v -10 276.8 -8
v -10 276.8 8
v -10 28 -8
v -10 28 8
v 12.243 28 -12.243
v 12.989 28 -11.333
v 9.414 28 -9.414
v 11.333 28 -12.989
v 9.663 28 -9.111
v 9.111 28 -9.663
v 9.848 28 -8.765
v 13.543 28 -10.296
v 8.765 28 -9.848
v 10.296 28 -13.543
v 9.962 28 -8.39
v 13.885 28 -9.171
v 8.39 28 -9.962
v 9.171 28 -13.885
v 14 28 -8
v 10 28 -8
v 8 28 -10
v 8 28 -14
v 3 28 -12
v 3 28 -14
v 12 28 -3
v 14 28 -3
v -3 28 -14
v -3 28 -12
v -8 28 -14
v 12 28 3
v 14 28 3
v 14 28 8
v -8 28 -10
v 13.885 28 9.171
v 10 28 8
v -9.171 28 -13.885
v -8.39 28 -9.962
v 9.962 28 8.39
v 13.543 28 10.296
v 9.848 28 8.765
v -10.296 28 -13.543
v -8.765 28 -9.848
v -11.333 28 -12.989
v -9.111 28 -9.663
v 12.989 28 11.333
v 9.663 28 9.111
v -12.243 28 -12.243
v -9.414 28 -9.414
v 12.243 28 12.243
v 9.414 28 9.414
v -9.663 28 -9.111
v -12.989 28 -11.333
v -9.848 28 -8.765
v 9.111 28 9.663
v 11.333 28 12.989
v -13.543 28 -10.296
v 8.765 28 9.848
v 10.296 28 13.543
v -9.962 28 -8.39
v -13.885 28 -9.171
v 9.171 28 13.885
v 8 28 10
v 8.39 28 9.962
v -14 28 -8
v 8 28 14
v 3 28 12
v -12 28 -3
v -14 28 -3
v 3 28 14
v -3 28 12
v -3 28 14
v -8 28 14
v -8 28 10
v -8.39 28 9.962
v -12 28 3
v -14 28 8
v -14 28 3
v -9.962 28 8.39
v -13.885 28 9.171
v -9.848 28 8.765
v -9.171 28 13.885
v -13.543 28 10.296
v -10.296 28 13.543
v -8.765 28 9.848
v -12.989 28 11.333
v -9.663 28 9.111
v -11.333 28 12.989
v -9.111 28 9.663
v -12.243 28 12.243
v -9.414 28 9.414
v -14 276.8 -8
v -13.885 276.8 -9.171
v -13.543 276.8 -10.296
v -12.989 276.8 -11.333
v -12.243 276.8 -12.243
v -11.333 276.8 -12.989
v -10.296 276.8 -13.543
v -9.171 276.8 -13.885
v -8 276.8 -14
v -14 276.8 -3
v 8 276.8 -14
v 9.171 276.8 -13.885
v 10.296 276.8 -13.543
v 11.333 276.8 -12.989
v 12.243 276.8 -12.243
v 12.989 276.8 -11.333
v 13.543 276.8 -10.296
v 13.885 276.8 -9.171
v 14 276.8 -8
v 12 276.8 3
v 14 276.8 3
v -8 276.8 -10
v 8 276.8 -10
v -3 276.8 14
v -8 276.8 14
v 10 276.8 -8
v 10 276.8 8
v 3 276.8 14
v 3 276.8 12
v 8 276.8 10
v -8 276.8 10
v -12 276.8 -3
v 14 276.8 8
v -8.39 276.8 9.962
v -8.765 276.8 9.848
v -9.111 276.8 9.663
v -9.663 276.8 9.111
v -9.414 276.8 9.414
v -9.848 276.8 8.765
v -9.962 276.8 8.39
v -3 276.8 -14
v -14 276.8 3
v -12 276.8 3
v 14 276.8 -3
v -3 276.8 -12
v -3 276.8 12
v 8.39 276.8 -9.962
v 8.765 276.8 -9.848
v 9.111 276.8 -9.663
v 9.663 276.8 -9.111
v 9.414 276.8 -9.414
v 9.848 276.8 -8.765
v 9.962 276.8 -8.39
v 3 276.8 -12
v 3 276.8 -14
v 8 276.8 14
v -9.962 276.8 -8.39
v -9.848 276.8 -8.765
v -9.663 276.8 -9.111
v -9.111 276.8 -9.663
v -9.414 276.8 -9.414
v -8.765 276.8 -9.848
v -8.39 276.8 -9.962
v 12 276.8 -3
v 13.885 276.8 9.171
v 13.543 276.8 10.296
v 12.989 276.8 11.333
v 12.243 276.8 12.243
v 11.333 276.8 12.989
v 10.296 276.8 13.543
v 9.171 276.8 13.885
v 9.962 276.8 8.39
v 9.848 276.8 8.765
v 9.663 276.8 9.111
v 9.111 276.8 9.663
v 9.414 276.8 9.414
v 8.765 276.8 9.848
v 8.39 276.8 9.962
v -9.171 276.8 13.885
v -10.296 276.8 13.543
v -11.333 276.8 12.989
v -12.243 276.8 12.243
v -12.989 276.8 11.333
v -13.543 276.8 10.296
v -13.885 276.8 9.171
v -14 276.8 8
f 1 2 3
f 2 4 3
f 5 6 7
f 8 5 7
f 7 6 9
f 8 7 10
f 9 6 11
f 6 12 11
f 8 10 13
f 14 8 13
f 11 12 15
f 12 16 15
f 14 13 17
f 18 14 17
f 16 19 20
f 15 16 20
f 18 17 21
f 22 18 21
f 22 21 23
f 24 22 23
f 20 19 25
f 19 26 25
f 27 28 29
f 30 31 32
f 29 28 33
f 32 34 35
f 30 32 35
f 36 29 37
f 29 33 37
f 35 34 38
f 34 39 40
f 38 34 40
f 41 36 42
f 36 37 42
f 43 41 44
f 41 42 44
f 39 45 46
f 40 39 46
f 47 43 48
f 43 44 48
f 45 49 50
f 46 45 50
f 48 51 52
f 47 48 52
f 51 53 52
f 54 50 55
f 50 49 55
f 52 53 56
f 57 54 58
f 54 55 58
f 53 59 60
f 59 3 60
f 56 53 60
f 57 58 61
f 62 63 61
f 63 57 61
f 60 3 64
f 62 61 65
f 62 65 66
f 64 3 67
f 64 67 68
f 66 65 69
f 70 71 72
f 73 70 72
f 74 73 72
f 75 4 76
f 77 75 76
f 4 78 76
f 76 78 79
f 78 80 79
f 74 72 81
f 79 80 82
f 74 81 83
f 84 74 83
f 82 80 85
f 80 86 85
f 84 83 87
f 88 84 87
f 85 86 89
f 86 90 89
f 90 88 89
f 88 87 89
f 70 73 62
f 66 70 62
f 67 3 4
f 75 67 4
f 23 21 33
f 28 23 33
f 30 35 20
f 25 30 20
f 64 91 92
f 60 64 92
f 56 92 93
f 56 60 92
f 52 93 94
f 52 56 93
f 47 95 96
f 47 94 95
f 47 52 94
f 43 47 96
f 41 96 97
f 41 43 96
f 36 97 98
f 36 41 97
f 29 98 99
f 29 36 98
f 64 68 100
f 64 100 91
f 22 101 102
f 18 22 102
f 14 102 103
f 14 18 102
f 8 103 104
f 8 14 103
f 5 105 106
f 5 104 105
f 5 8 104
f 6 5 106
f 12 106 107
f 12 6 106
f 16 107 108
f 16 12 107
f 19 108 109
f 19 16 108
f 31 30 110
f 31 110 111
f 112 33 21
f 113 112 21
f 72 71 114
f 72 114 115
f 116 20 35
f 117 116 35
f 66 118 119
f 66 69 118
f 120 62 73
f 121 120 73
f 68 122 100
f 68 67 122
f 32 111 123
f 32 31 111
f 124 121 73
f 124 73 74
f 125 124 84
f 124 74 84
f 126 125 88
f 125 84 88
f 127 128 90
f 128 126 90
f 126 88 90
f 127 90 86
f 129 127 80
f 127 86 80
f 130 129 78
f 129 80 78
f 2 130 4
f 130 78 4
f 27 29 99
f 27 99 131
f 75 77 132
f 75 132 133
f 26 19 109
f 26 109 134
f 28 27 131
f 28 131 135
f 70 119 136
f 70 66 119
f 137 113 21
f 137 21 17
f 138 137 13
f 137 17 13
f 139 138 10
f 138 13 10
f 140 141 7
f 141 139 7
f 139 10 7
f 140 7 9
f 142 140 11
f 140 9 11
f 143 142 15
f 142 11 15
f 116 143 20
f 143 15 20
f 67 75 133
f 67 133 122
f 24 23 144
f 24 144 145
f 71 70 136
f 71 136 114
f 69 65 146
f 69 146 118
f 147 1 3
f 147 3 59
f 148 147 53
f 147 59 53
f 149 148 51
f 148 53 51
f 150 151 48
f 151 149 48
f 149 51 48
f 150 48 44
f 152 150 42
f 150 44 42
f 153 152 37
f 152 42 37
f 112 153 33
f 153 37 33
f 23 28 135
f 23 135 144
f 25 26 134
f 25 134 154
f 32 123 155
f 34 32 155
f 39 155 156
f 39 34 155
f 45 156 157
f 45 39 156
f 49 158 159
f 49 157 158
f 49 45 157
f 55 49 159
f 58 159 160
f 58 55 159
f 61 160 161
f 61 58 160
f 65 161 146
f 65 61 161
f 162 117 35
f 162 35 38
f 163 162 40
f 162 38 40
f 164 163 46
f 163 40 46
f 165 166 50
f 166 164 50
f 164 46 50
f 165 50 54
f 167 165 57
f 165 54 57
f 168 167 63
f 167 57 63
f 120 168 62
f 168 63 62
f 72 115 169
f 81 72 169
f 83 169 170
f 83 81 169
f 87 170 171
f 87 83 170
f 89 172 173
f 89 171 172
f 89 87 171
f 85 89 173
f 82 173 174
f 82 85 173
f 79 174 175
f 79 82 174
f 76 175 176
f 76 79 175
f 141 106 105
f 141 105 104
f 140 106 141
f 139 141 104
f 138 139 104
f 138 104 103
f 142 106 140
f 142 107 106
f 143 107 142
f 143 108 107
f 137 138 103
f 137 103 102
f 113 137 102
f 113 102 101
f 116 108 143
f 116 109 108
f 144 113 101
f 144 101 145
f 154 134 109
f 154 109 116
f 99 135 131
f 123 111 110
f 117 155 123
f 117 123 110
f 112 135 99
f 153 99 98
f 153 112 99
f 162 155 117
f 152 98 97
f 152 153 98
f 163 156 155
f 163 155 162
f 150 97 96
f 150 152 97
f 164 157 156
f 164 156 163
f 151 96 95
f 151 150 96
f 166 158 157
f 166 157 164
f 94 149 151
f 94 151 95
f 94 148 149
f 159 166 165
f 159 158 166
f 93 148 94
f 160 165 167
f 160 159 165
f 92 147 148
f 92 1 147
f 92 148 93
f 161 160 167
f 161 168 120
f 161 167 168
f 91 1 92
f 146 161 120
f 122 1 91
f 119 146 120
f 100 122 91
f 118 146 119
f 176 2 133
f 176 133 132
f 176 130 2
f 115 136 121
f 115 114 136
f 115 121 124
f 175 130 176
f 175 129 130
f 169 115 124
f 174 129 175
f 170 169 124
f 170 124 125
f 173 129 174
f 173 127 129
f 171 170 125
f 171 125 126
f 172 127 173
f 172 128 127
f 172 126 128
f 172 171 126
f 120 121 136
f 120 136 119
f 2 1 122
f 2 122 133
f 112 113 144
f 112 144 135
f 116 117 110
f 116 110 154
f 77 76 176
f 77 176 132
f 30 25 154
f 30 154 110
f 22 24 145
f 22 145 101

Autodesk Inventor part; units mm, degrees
ref_plane "Start Plane" through (0, 28, 0) normal (0, 1, 0) x (-1, 0, 0)
ref_plane "End Plane" through (0, 276.8, 0) normal (0, 1, 0) x (-1, 0, 0)
sketch "Sketch" plane through (0, 0, 0) normal (0, 1, 0) x (-1, 0, 0)
  line L0 (8, -10) -> (-8, -10)
  line L1 (-10, -8) -> (-10, 8)
  line L2 (-8, 10) -> (8, 10)
  line L3 (10, 8) -> (10, -8)
  line L4 (10, -10) -> (-10, 10) construction
  line L5 (-10, -10) -> (10, 10) construction
  line L6 (14, -14) -> (-14, 14) construction
  line L7 (-14, -14) -> (14, 14) construction
  arc A0 (8, -10) -> (10, -8) centre (8, -8) ccw
  arc A1 (-10, -8) -> (-8, -10) centre (-8, -8) ccw
  arc A2 (-8, 10) -> (-10, 8) centre (-8, 8) ccw
  arc A3 (10, 8) -> (8, 10) centre (8, 8) ccw
  arc A4 (8, -14) -> (14, -8) centre (8, -8) ccw
  arc A5 (-14, -8) -> (-8, -14) centre (-8, -8) ccw
  arc A6 (-8, 14) -> (-14, 8) centre (-8, 8) ccw
  arc A7 (14, 8) -> (8, 14) centre (8, 8) ccw
  line L8 (3, -14) -> (3, -12)
  line L9 (3, -12) -> (-3, -12)
  line L10 (-3, -12) -> (-3, -14)
  line L11 (-14, -3) -> (-12, -3)
  line L12 (-12, -3) -> (-12, 3)
  line L13 (-12, 3) -> (-14, 3)
  line L14 (-3, 14) -> (-3, 12)
  line L15 (-3, 12) -> (3, 12)
  line L16 (3, 12) -> (3, 14)
  line L17 (14, 3) -> (12, 3)
  line L18 (12, 3) -> (12, -3)
  line L19 (12, -3) -> (14, -3)
  line L20 (0, -10) -> (0, -12) construction
  line L21 (-10, 0) -> (-12, 0) construction
  line L22 (0, 10) -> (0, 12) construction
  line L23 (10, 0) -> (12, 0) construction
  line L24 (14, 8) -> (14, 3)
  line L25 (14, -3) -> (14, -8)
  line L26 (8, -14) -> (3, -14)
  line L27 (-3, -14) -> (-8, -14)
  line L28 (-14, -8) -> (-14, -3)
  line L29 (-14, 3) -> (-14, 8)
  line L30 (-8, 14) -> (-3, 14)
  line L31 (3, 14) -> (8, 14)
  point P0 (0, 0)
  dimension "d1" = 20
  dimension "d2" = 2
  dimension "d3" = 6
  dimension "d4" = 20
  dimension "d5" = 6
  dimension "d6" = 2
  dimension "d8" = 28
extrude "Body" add sketch "Sketch" along normal up to surface (248.8 mm away) from surface at 28
sketch "Sketch2" plane through (0, 0, 0) normal (0, 1, 0) x (-1, 0, 0)
  line L0 (0, 0) -> (10, 0)
ref_plane "Work Plane3" through (0, 0, 0) normal (0, 0, -1) x (-1, 0, 0)
sketch "Sketch3" plane through (0, 0, 0) normal (0, 0, -1) x (-1, 0, 0)
  line L0 (-2, 28) -> (12, 28) construction
  line L1 (-2, 276.8) -> (12, 276.8) construction
  dimension "d16" = 248.8
ref_plane "Work Plane4" through (-290.8, 28, -8) normal (0, -1, 0) x (1, 0, 0)
split "Split1" plane through (-290.8, 28, -8) removes the side toward (0, -1, 0)
ref_plane "Work Plane5" through (14, 276.8, -8) normal (0, 1, 0) x (1, 0, 0)
split "Split2" plane through (14, 276.8, -8) removes the side toward (0, 1, 0)
equation "\"G_OFFSET_START\" = -28"
equation "\"G_OFFSET_END\" = -28"
equation "\"d11\" = -G_OFFSET_START"
equation "\"d12\" = Length + G_OFFSET_END"
equation "\"G_L\" = d16"
equation "\"Length\" = 304.8"
properties part number "CE-5.2.2-PR" material "Steel, Mild"
